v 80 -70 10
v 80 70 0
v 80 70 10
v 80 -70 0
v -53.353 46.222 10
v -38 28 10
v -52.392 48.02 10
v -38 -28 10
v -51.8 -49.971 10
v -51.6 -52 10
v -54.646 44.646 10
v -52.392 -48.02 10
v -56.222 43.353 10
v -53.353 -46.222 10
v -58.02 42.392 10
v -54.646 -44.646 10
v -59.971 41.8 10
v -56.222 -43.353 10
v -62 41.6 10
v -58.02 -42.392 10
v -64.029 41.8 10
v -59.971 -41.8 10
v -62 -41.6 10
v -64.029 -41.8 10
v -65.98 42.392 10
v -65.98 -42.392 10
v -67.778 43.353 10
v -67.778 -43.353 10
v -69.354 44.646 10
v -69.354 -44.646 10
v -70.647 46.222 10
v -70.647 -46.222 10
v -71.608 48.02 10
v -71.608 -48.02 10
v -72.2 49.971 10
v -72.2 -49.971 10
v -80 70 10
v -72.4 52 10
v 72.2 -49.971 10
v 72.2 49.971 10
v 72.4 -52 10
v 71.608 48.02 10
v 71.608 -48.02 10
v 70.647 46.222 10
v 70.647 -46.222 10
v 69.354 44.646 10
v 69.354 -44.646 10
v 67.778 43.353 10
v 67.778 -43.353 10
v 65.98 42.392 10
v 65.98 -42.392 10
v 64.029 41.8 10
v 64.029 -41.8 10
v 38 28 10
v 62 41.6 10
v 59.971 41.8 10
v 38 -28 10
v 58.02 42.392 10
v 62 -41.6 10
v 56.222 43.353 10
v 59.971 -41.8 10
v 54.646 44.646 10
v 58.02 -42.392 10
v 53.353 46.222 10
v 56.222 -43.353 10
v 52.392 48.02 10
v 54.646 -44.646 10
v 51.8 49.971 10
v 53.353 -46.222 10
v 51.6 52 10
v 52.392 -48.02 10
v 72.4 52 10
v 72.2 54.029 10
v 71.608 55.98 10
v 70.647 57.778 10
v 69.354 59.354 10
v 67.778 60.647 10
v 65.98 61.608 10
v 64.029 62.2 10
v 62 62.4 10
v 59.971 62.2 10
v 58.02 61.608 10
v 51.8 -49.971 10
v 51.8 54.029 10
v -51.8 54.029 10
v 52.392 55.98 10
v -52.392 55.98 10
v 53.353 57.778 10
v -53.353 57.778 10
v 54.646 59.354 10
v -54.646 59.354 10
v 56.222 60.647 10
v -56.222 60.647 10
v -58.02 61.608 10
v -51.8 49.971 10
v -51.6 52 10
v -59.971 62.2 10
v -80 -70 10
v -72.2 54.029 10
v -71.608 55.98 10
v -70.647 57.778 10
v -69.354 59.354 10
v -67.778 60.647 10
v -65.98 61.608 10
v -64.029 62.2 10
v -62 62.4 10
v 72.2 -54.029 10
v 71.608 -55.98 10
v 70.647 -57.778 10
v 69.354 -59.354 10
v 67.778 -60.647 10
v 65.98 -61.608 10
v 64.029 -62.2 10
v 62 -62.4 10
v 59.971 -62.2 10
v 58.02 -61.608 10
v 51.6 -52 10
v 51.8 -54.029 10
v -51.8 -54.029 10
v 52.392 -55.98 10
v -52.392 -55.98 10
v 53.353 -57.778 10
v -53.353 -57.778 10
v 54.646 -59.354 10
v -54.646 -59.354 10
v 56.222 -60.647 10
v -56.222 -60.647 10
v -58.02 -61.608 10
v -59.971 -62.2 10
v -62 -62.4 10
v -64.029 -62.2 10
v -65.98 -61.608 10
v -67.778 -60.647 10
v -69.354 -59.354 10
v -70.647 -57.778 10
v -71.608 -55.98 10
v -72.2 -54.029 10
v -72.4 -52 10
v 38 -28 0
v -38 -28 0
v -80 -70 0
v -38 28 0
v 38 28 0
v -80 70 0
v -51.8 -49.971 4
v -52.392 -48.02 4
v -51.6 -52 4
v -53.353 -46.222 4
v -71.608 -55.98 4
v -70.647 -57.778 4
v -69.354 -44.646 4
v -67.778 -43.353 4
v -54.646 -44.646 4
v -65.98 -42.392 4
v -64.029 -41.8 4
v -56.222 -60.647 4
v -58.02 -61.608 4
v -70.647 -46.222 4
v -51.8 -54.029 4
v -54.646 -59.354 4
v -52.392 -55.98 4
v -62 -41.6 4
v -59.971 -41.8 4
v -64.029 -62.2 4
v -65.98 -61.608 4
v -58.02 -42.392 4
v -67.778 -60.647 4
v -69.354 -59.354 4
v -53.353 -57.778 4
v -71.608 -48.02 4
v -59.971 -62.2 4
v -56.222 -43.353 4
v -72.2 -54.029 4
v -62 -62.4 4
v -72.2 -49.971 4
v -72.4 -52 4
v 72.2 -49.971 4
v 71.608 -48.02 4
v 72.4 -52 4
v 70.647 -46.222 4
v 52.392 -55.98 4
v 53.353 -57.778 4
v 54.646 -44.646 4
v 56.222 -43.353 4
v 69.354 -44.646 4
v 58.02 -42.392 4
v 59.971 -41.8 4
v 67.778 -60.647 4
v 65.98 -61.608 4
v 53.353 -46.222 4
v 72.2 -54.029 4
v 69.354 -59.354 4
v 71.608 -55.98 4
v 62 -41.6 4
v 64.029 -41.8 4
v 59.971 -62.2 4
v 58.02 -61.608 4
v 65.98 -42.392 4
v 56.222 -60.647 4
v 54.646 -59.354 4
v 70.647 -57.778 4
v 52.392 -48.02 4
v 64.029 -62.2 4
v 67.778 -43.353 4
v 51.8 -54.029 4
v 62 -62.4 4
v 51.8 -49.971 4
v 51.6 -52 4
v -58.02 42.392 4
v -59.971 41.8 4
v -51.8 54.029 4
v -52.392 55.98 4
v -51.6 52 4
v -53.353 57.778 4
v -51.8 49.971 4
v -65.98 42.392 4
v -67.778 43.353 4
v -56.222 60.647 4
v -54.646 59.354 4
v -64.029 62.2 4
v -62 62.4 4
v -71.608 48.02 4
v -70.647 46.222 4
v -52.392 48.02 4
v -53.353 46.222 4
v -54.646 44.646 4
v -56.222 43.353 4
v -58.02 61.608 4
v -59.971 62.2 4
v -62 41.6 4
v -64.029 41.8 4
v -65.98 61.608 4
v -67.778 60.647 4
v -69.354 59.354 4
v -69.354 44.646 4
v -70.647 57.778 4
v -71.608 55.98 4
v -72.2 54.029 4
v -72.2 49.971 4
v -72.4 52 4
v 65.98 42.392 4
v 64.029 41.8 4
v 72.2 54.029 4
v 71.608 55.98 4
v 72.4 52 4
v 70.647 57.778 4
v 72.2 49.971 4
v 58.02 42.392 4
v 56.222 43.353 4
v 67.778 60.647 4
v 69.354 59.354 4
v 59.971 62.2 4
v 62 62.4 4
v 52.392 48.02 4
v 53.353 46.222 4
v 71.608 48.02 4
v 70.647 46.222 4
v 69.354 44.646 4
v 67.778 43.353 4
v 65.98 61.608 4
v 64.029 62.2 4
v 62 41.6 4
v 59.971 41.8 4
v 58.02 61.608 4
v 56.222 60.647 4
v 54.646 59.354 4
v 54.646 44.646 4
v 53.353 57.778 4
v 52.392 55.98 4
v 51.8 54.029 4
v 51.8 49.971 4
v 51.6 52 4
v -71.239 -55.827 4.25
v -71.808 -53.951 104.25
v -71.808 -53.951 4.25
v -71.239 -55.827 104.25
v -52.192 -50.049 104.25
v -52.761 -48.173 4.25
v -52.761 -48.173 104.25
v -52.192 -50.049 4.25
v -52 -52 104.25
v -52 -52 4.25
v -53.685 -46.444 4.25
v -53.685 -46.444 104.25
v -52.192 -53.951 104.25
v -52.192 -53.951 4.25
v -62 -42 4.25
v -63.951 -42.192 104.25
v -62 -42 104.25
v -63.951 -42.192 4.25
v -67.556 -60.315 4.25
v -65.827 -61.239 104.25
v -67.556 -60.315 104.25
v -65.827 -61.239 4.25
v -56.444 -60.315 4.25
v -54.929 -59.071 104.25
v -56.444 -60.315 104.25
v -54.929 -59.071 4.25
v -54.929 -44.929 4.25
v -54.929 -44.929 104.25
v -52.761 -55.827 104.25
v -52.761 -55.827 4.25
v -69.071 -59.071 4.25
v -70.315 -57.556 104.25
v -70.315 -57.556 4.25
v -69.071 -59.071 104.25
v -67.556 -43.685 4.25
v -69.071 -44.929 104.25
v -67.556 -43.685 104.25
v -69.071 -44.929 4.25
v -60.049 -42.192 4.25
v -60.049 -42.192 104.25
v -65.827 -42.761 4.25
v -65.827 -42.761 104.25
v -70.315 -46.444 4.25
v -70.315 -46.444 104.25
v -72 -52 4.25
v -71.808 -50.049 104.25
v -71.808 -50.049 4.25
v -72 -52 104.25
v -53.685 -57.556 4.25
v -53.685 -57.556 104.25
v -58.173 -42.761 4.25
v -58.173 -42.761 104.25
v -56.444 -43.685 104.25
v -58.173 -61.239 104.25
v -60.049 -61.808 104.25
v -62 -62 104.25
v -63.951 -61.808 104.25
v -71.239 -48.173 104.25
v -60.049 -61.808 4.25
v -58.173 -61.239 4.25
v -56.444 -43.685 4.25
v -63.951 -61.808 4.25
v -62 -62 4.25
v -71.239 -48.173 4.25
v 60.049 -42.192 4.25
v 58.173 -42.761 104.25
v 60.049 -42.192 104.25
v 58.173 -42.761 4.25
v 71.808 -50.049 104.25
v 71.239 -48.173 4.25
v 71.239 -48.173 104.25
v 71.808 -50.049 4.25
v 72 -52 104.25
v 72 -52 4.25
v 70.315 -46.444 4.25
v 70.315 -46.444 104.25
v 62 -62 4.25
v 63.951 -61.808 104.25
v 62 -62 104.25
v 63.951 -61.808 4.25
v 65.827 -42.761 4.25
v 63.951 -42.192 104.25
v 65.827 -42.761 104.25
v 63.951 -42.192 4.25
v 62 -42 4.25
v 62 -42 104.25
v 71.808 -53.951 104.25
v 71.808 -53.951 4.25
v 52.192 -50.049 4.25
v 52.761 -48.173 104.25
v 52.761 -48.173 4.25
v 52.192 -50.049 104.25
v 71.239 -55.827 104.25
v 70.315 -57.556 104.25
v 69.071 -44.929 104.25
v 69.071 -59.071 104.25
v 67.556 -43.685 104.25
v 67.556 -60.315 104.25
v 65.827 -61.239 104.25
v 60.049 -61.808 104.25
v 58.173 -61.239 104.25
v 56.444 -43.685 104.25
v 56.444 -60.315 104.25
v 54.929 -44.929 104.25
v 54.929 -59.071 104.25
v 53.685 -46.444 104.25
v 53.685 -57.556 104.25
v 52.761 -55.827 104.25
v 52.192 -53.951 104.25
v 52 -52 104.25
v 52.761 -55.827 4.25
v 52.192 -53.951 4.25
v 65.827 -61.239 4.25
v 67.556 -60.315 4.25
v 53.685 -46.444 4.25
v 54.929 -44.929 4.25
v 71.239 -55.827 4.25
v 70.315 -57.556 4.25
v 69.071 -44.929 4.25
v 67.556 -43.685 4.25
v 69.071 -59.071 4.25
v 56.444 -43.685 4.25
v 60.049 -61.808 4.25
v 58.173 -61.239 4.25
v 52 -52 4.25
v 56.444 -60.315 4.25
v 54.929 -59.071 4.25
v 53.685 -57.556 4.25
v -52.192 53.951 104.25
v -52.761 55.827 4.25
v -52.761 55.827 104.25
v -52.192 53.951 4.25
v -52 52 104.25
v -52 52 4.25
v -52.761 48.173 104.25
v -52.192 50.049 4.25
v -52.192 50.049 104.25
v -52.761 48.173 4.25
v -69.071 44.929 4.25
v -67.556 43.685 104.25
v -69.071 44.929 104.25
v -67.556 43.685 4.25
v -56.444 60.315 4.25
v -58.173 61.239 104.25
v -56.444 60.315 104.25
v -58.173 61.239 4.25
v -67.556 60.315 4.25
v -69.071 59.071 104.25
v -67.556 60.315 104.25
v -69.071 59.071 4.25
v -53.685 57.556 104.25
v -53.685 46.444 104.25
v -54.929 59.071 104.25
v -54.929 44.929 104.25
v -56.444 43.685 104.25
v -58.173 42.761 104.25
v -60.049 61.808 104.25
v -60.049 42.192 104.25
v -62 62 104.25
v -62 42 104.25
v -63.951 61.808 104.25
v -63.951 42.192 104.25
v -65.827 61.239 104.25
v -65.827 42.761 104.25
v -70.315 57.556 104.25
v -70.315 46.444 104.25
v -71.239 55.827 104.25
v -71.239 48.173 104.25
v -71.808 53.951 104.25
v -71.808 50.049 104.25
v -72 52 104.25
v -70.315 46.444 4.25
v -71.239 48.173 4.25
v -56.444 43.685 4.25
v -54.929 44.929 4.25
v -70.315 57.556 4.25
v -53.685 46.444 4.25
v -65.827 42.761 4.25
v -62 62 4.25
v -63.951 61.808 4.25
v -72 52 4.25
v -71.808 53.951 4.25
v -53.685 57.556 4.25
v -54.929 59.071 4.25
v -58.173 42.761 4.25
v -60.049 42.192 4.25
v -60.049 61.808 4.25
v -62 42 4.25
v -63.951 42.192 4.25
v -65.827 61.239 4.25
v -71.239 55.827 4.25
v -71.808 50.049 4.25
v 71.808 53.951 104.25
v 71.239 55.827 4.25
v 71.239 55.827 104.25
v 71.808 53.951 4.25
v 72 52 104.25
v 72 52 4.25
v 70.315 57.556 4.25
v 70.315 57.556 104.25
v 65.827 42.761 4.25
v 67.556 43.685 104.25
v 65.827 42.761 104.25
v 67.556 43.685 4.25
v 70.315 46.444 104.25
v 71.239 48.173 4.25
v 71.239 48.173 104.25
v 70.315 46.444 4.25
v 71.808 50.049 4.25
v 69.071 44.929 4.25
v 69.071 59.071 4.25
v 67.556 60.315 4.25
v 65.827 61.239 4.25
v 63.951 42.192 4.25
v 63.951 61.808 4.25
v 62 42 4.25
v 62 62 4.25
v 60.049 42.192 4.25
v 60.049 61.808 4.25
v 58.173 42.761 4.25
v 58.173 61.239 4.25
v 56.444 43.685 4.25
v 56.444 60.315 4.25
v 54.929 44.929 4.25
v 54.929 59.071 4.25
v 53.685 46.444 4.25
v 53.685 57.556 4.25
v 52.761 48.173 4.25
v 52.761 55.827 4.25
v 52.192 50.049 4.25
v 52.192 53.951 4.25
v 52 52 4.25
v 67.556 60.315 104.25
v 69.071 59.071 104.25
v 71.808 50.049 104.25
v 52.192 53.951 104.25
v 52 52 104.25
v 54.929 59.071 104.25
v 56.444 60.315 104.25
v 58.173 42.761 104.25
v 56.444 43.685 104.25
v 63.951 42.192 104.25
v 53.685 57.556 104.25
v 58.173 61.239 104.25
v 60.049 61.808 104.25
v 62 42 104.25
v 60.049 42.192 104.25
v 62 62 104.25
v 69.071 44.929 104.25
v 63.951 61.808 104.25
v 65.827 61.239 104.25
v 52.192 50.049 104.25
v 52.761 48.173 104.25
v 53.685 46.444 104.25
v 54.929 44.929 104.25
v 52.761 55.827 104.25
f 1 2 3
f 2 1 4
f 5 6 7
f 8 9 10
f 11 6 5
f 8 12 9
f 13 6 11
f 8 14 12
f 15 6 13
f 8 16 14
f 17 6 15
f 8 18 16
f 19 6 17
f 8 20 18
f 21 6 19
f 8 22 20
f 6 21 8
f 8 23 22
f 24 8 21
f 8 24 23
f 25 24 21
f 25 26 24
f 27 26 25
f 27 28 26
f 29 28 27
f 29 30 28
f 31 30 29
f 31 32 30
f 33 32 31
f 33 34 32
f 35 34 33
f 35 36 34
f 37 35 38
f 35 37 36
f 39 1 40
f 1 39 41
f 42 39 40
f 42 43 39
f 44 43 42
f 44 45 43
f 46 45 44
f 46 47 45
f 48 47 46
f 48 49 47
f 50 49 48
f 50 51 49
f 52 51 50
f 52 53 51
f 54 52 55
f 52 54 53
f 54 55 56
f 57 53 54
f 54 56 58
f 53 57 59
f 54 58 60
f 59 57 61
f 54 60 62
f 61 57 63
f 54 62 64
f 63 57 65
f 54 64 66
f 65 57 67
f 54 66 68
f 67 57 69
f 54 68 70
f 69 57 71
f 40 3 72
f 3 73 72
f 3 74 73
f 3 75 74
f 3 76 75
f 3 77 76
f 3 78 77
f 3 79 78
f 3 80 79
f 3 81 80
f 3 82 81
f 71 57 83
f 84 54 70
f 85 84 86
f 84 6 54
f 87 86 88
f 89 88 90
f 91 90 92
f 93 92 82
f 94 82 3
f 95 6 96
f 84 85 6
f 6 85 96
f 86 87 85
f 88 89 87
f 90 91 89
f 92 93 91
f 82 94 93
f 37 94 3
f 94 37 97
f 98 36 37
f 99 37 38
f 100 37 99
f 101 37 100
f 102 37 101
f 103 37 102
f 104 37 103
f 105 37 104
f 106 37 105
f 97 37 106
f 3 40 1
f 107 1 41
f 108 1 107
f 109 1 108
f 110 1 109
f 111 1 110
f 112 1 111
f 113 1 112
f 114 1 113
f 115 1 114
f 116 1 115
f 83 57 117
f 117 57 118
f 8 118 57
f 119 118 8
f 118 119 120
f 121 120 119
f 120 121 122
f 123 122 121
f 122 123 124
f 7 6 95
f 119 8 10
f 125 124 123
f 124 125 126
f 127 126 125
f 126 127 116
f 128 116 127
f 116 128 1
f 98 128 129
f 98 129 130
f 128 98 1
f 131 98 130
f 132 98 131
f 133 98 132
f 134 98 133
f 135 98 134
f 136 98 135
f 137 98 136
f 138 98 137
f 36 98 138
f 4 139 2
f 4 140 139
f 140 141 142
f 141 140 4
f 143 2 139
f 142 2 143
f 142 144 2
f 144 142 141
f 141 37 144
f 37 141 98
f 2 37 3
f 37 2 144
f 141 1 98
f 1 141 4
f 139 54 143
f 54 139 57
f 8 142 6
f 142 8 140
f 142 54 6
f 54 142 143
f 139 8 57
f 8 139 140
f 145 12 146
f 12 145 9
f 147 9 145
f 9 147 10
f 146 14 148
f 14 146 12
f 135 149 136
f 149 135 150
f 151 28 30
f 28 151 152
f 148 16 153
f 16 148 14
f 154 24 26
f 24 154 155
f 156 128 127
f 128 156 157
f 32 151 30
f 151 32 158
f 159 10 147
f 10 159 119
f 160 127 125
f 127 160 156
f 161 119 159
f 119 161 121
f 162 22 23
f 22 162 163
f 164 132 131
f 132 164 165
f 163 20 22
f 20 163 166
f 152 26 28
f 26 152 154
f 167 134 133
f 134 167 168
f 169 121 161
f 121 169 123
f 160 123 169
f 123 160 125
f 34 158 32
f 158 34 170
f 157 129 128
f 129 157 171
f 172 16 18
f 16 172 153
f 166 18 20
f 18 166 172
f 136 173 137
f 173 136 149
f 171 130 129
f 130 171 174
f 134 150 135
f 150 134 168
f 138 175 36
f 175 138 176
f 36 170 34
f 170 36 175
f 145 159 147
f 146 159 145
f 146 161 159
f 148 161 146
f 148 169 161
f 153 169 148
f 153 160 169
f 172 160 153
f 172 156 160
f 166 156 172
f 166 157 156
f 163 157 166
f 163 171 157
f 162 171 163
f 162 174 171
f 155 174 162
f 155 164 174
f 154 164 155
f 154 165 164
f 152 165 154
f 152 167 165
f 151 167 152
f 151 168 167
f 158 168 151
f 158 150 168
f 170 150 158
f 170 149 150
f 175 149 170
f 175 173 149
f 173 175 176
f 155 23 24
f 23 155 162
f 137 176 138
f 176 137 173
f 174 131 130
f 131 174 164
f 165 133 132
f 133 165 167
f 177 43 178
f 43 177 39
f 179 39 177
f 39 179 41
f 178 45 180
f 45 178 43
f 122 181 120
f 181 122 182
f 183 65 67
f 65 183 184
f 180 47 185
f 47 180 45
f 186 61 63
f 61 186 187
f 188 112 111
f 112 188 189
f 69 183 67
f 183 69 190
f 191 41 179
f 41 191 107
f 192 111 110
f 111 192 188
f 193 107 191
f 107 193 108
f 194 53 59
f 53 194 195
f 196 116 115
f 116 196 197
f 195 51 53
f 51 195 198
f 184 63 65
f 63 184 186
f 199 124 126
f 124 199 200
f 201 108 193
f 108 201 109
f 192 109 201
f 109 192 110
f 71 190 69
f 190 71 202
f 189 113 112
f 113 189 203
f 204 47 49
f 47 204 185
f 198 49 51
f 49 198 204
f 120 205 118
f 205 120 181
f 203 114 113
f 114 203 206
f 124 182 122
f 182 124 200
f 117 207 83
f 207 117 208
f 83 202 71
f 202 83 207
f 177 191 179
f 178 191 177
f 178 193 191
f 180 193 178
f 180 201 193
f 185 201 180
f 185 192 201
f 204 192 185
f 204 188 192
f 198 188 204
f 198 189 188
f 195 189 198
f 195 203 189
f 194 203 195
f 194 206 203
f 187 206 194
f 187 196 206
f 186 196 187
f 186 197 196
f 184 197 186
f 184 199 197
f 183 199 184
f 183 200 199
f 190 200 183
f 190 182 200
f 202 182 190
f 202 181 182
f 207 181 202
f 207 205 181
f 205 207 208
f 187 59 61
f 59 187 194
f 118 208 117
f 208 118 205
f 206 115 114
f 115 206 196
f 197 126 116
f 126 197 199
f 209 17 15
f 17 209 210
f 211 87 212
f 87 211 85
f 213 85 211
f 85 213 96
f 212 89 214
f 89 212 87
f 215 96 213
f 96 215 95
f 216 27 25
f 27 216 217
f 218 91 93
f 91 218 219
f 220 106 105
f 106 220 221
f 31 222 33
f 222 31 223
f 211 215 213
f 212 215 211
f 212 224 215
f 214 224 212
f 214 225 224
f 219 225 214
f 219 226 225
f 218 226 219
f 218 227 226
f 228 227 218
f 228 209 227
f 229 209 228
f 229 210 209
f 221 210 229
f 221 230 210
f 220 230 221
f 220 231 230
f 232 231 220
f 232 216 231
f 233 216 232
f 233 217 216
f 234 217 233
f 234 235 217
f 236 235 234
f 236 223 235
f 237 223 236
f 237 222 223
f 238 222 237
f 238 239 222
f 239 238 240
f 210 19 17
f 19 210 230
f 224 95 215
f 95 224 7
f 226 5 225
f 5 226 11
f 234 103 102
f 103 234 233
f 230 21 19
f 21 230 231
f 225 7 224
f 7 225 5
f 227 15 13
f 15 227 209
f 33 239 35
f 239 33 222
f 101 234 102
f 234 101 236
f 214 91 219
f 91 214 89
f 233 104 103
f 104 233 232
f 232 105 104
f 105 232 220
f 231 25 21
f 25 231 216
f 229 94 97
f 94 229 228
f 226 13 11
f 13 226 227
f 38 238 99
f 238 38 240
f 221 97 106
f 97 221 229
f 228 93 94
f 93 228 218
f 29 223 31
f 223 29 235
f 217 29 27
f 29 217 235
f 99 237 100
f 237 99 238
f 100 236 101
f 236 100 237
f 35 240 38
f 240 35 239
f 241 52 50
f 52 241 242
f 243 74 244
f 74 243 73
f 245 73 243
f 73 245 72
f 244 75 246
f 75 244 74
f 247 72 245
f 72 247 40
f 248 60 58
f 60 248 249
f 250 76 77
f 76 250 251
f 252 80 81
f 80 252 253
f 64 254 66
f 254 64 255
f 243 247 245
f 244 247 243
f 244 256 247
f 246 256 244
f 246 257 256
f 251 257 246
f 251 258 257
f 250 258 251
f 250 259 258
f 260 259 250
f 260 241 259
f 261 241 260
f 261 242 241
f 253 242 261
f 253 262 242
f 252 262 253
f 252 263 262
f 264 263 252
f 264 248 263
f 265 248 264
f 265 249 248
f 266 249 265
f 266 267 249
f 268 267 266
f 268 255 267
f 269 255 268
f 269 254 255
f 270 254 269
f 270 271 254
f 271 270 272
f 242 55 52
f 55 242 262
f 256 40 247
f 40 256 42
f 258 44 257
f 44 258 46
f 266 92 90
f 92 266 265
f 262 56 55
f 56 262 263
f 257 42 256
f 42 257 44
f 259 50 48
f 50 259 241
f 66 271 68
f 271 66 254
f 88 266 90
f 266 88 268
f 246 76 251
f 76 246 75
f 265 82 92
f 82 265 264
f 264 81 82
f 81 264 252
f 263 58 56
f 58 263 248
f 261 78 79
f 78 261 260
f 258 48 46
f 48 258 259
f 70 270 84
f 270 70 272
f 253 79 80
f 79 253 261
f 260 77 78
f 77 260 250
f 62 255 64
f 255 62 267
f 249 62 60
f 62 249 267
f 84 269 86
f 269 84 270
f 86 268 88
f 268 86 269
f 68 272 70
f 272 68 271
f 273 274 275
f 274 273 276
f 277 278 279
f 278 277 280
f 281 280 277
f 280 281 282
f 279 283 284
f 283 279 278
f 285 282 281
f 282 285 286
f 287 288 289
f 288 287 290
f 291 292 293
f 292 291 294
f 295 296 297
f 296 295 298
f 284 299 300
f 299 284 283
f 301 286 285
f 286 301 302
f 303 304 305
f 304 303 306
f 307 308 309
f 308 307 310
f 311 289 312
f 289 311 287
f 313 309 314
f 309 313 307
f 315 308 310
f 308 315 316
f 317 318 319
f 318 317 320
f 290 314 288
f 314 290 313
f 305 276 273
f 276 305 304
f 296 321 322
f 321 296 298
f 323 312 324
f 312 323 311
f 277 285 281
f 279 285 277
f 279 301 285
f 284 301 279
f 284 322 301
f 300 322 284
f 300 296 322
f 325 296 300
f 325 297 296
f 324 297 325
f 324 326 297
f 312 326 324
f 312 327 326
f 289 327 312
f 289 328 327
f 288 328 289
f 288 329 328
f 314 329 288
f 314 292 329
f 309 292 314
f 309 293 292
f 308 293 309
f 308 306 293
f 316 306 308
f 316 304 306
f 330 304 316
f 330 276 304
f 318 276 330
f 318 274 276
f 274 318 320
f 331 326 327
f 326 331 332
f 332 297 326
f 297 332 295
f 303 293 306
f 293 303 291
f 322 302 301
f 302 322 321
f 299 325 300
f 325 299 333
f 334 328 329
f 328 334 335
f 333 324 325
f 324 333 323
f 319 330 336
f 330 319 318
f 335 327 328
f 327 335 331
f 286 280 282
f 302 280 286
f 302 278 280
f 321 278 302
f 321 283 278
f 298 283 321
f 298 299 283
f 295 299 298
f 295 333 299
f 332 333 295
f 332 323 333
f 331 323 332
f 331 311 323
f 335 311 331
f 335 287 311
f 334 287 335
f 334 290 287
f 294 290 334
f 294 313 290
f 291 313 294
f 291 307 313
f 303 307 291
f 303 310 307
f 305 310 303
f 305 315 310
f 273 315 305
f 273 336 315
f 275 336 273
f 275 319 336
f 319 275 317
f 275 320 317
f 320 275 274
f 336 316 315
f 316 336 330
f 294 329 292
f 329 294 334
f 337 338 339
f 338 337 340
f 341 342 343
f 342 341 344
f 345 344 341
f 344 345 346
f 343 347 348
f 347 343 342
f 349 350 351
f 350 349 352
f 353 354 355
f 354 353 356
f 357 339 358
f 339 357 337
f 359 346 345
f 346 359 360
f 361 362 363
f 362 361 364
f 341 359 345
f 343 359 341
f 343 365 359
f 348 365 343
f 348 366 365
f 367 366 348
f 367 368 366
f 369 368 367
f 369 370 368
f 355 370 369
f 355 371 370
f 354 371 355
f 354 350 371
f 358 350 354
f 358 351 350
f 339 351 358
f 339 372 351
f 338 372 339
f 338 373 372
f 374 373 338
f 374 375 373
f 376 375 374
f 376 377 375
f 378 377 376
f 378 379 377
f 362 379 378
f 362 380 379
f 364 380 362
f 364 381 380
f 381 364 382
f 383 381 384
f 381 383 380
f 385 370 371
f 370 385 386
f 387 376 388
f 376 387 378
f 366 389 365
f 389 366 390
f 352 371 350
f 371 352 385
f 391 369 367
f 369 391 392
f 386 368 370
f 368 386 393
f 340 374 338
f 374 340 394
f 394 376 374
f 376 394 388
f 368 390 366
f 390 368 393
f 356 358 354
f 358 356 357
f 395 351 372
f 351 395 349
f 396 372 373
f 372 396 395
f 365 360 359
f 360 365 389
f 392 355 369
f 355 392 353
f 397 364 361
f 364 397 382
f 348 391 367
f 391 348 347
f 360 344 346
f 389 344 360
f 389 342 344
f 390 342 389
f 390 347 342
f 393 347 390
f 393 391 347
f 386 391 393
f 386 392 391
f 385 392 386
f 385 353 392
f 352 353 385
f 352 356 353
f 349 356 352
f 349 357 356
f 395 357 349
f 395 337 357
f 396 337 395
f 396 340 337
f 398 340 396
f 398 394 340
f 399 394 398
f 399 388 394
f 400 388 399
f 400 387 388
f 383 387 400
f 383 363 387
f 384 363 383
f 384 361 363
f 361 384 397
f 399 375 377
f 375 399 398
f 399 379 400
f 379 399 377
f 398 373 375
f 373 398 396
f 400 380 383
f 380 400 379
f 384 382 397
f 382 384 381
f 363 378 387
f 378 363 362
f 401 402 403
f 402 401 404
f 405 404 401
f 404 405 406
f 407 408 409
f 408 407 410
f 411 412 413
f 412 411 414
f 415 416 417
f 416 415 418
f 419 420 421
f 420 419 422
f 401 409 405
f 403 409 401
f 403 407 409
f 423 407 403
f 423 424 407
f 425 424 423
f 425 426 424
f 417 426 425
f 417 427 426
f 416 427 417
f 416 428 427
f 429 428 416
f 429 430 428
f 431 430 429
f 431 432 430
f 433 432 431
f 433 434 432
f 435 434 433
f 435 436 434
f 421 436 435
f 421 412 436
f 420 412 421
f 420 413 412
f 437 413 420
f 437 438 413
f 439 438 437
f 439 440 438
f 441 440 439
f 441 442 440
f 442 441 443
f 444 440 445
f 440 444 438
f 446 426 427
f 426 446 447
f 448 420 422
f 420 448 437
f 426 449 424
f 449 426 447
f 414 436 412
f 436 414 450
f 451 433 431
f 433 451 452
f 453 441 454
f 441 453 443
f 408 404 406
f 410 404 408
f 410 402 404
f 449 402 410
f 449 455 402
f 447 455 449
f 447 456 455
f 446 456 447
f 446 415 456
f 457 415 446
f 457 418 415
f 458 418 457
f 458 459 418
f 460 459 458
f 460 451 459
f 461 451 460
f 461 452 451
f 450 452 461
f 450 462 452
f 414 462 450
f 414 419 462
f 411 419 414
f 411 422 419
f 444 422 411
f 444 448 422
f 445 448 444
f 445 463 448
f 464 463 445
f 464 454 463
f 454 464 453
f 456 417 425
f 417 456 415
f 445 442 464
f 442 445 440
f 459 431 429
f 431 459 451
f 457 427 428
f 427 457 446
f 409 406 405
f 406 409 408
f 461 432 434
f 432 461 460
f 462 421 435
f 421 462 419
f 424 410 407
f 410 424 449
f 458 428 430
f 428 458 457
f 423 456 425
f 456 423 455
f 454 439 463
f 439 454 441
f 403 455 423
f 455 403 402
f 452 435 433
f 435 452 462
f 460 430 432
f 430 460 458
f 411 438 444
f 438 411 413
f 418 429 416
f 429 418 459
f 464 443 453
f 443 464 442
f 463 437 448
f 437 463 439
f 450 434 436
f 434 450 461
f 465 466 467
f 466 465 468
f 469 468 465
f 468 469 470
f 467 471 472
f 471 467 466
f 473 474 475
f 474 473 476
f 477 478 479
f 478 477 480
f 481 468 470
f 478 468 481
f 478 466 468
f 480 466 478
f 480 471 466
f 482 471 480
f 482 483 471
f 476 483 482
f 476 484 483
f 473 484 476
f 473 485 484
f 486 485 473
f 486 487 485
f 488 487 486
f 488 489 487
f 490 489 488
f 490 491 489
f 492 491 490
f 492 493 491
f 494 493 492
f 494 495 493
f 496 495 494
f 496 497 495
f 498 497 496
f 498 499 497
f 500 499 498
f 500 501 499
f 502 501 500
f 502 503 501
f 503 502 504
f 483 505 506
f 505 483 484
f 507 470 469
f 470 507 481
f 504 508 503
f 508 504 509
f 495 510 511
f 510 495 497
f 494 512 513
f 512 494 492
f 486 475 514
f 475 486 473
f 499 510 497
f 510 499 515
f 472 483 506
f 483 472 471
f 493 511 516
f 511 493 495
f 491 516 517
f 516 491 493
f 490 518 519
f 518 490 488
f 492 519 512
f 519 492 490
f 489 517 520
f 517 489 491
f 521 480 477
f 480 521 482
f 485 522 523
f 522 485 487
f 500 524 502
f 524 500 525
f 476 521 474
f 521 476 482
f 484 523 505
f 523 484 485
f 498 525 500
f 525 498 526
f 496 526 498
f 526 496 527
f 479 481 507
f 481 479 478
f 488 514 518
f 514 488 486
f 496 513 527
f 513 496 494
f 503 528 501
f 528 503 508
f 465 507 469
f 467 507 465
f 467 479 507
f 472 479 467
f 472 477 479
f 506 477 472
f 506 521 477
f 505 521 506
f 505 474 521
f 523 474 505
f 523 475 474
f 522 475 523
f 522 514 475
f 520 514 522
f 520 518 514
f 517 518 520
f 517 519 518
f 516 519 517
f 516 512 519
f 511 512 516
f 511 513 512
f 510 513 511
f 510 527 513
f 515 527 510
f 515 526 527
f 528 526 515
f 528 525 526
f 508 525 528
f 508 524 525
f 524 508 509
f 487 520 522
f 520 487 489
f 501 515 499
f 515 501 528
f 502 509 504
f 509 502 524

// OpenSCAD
$fn = 32;

// ------------------------------------------------------------------------
// Frame with four posts: 160 x 140 mm frame, four d20 posts
// Every part is its own module, assembly() places them once.
// ------------------------------------------------------------------------

// --- part 1 ---
module base_frame() {
  difference() {
    translate([-80, -70, 0]) cube([160, 140, 10]);
    translate([-38, -28, -1]) cube([76, 56, 12]);
    translate([-62, -52, 4]) cylinder(h = 7, d = 20.8);
    translate([62, -52, 4]) cylinder(h = 7, d = 20.8);
    translate([-62, 52, 4]) cylinder(h = 7, d = 20.8);
    translate([62, 52, 4]) cylinder(h = 7, d = 20.8);
  }
}

// --- part 2 ---
module post1() {
  cylinder(h = 100, d = 20);
}

// --- part 3 ---
module post2() {
  cylinder(h = 100, d = 20);
}

// --- part 4 ---
module post3() {
  cylinder(h = 100, d = 20);
}

// --- part 5 ---
module post4() {
  cylinder(h = 100, d = 20);
}

// --- assembly ---
module assembly() {
  translate([0, 0, 0]) rotate([0, 0, 0]) base_frame();
  translate([-62, -52, 4.25]) rotate([0, 0, 0]) post1();
  translate([62, -52, 4.25]) rotate([0, 0, 0]) post2();
  translate([-62, 52, 4.25]) rotate([0, 0, 0]) post3();
  translate([62, 52, 4.25]) rotate([0, 0, 0]) post4();
}

assembly();
